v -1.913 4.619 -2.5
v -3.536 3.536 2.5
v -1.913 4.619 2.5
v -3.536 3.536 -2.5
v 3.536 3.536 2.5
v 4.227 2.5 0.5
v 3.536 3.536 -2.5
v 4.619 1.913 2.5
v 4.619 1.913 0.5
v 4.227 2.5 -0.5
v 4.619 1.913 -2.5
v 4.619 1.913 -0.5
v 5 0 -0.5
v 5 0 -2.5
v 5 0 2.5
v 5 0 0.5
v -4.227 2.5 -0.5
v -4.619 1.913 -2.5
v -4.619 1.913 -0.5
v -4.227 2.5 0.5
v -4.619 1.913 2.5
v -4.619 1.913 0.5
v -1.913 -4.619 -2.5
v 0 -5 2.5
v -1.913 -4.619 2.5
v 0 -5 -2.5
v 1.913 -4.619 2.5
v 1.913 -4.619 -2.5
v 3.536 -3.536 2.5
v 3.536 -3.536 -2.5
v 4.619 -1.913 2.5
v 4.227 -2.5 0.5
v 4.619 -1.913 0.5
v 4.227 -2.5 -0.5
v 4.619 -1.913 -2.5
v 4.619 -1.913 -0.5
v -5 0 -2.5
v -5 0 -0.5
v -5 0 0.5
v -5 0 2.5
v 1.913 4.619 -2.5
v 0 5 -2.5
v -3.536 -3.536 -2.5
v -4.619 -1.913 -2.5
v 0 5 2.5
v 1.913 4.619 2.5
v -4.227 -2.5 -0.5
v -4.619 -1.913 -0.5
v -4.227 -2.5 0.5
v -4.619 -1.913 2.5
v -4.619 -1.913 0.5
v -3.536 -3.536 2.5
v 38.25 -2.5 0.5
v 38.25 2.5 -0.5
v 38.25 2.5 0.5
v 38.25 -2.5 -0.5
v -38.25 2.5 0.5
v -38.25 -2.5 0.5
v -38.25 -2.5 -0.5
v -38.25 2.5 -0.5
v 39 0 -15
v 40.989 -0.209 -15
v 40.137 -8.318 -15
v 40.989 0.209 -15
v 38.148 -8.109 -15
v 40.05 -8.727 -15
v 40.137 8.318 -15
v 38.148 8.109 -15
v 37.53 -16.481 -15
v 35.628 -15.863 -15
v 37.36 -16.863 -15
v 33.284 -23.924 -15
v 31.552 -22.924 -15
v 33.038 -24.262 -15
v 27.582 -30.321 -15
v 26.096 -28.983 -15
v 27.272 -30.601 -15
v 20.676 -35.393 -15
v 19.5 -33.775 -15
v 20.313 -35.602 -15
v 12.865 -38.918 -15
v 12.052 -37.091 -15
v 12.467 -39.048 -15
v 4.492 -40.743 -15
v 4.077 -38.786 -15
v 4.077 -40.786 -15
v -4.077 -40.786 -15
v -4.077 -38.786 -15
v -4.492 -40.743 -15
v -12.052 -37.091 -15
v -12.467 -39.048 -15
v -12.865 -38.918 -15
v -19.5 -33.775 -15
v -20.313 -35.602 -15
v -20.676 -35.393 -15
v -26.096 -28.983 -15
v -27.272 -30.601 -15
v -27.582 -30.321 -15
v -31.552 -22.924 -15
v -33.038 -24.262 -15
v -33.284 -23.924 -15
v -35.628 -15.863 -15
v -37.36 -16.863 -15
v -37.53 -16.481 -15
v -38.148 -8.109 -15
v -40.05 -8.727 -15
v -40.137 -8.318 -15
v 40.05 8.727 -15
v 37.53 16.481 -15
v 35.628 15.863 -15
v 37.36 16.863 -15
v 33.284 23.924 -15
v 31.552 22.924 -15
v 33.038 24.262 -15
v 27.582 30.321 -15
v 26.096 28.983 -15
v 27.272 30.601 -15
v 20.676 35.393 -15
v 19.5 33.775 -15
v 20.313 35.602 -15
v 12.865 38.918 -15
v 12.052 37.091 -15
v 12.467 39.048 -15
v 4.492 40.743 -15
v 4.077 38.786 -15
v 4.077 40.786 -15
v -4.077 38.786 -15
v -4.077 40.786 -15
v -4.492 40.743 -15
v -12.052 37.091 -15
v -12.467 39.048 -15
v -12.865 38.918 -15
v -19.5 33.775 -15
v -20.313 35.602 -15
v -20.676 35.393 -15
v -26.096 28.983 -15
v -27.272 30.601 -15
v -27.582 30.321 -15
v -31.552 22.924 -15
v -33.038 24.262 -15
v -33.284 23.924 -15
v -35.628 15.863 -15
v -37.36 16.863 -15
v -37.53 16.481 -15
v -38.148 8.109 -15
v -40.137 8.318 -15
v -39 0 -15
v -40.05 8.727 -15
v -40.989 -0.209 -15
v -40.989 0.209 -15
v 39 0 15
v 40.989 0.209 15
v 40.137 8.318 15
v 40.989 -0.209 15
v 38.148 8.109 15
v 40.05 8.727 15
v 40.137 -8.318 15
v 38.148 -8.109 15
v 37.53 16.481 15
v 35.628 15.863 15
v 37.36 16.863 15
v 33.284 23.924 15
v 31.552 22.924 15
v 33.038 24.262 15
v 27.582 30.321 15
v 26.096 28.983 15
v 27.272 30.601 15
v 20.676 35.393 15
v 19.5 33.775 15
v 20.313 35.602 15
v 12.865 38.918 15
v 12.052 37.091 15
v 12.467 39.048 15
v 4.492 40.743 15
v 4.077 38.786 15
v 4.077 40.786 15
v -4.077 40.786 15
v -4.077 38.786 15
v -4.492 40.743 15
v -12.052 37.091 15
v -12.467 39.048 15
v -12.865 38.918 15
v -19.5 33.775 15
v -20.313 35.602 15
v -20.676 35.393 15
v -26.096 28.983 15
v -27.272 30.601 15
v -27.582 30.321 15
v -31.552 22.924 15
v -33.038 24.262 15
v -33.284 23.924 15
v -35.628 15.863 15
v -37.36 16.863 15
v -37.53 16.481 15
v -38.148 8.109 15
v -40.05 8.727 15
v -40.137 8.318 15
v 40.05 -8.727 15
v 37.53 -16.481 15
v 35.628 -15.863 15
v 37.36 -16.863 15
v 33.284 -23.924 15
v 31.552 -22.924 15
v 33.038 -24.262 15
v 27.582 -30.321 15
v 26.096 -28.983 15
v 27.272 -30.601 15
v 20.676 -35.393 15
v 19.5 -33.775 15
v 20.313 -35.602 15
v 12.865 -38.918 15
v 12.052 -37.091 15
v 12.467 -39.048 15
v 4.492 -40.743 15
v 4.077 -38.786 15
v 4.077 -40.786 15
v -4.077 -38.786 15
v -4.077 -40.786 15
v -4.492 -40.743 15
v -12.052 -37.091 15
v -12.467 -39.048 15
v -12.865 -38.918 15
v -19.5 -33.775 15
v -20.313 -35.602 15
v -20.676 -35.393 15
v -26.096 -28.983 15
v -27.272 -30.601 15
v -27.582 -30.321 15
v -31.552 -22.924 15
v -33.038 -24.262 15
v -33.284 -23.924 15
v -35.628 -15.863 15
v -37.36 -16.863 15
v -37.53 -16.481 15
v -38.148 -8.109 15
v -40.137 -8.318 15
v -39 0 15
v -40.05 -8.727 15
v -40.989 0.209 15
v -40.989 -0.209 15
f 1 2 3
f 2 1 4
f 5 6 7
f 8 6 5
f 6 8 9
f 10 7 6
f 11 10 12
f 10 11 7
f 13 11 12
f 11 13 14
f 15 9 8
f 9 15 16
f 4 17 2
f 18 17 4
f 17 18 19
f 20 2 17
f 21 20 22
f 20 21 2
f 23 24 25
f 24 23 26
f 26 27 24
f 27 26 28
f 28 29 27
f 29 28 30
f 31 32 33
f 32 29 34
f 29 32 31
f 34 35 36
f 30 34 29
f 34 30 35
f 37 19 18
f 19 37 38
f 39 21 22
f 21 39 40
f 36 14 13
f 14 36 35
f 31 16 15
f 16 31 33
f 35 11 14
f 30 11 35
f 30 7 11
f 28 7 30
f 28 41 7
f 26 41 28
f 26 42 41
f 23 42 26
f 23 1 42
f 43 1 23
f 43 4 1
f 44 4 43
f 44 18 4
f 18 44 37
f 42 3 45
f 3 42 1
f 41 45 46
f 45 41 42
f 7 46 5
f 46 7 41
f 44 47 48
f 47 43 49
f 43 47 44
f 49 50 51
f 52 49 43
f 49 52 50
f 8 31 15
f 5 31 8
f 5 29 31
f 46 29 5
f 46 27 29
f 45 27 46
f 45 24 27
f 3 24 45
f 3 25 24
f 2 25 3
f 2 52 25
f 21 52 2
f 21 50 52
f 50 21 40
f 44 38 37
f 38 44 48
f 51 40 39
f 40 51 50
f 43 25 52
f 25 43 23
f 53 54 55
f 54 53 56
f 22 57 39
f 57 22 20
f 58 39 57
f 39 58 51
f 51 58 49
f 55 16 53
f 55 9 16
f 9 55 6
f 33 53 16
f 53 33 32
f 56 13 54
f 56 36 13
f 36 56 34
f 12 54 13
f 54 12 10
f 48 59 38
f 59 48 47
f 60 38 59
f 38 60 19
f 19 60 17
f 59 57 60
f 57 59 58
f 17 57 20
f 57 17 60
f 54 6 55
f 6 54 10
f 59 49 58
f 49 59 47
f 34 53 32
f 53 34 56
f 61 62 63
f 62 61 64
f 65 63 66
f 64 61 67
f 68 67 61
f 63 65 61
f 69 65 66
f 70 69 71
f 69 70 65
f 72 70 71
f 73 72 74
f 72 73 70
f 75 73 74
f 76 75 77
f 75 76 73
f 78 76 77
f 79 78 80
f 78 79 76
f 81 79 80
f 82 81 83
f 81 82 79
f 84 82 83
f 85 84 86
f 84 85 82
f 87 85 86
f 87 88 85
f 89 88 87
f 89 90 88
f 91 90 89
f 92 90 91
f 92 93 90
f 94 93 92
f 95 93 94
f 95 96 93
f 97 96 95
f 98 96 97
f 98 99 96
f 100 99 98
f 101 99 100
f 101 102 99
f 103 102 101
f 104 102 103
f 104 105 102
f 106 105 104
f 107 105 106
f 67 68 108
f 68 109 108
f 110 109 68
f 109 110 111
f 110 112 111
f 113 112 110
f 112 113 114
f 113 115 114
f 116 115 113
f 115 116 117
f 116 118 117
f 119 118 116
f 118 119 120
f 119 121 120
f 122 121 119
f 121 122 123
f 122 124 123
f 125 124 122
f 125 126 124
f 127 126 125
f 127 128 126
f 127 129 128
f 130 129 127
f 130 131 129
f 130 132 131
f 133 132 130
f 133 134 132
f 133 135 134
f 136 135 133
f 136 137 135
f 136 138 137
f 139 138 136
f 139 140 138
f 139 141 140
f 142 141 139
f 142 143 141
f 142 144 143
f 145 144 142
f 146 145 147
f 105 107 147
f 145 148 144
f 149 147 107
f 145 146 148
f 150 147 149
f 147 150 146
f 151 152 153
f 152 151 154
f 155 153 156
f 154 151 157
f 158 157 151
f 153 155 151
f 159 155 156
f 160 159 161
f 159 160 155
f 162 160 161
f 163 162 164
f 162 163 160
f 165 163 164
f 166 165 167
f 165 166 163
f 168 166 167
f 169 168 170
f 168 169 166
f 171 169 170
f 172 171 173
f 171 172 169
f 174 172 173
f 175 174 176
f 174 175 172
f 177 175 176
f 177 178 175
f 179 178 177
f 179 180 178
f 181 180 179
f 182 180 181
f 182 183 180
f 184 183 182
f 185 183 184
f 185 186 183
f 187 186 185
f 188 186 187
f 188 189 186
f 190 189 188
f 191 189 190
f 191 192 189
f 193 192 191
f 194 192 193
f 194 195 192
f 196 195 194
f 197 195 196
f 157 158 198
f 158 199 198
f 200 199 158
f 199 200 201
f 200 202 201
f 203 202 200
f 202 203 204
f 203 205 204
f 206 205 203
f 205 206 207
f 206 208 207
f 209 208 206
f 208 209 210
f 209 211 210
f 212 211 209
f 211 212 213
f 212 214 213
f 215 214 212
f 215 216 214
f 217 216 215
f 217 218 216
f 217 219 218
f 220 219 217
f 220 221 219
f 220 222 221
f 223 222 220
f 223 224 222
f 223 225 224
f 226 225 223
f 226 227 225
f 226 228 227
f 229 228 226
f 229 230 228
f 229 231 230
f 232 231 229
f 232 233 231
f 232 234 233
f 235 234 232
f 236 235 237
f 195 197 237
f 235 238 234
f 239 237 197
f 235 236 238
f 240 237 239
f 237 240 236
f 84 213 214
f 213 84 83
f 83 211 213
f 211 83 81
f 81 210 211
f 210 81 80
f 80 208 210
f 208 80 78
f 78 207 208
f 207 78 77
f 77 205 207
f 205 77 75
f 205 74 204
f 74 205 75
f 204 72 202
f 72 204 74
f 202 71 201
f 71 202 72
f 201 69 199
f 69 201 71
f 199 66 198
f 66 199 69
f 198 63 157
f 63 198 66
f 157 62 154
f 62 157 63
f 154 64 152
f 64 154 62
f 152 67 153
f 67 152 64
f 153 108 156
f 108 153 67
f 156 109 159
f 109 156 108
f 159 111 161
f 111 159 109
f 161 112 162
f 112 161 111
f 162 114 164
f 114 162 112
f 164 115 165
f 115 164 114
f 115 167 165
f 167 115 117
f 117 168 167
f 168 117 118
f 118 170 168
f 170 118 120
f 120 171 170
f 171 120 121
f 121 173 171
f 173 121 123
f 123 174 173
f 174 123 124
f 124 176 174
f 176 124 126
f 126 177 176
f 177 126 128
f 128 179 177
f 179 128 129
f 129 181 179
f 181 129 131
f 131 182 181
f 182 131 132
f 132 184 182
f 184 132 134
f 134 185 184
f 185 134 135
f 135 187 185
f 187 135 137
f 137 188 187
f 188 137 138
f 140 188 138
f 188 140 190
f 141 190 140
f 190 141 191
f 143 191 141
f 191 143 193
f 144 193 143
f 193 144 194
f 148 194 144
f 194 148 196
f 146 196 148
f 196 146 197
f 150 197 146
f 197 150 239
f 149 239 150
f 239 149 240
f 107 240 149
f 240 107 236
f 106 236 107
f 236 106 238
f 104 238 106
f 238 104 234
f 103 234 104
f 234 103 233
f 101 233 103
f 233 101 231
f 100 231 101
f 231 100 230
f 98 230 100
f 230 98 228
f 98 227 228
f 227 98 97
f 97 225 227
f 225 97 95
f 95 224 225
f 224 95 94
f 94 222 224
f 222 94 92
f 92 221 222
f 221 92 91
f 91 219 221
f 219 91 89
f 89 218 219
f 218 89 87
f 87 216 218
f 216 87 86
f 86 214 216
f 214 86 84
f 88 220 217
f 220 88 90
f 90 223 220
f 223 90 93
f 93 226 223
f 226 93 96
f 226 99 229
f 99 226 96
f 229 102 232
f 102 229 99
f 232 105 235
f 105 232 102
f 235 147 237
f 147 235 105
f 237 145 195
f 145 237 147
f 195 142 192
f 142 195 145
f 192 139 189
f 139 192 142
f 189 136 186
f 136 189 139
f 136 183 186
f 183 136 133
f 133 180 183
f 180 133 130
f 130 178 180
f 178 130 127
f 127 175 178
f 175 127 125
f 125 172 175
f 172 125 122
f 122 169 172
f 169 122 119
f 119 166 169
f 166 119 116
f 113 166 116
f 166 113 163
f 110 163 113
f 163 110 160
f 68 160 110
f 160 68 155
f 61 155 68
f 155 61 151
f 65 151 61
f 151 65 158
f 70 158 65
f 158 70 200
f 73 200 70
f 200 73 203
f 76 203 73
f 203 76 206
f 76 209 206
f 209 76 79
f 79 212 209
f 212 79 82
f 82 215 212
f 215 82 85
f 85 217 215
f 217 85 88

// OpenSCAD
_3020PropWidth = 76.5;
_ductInnerDiameter = 78;

cylinder(h=5, r=5, center = true);
cube(size = [_3020PropWidth, 5, 1], center = true);

linear_extrude(height = 30, slices = 100, center = true) {
  difference() {
	offset(r = 2) {
		circle(d=_ductInnerDiameter, center = true);
	}
    circle(d=_ductInnerDiameter, center = true);
  }
}
